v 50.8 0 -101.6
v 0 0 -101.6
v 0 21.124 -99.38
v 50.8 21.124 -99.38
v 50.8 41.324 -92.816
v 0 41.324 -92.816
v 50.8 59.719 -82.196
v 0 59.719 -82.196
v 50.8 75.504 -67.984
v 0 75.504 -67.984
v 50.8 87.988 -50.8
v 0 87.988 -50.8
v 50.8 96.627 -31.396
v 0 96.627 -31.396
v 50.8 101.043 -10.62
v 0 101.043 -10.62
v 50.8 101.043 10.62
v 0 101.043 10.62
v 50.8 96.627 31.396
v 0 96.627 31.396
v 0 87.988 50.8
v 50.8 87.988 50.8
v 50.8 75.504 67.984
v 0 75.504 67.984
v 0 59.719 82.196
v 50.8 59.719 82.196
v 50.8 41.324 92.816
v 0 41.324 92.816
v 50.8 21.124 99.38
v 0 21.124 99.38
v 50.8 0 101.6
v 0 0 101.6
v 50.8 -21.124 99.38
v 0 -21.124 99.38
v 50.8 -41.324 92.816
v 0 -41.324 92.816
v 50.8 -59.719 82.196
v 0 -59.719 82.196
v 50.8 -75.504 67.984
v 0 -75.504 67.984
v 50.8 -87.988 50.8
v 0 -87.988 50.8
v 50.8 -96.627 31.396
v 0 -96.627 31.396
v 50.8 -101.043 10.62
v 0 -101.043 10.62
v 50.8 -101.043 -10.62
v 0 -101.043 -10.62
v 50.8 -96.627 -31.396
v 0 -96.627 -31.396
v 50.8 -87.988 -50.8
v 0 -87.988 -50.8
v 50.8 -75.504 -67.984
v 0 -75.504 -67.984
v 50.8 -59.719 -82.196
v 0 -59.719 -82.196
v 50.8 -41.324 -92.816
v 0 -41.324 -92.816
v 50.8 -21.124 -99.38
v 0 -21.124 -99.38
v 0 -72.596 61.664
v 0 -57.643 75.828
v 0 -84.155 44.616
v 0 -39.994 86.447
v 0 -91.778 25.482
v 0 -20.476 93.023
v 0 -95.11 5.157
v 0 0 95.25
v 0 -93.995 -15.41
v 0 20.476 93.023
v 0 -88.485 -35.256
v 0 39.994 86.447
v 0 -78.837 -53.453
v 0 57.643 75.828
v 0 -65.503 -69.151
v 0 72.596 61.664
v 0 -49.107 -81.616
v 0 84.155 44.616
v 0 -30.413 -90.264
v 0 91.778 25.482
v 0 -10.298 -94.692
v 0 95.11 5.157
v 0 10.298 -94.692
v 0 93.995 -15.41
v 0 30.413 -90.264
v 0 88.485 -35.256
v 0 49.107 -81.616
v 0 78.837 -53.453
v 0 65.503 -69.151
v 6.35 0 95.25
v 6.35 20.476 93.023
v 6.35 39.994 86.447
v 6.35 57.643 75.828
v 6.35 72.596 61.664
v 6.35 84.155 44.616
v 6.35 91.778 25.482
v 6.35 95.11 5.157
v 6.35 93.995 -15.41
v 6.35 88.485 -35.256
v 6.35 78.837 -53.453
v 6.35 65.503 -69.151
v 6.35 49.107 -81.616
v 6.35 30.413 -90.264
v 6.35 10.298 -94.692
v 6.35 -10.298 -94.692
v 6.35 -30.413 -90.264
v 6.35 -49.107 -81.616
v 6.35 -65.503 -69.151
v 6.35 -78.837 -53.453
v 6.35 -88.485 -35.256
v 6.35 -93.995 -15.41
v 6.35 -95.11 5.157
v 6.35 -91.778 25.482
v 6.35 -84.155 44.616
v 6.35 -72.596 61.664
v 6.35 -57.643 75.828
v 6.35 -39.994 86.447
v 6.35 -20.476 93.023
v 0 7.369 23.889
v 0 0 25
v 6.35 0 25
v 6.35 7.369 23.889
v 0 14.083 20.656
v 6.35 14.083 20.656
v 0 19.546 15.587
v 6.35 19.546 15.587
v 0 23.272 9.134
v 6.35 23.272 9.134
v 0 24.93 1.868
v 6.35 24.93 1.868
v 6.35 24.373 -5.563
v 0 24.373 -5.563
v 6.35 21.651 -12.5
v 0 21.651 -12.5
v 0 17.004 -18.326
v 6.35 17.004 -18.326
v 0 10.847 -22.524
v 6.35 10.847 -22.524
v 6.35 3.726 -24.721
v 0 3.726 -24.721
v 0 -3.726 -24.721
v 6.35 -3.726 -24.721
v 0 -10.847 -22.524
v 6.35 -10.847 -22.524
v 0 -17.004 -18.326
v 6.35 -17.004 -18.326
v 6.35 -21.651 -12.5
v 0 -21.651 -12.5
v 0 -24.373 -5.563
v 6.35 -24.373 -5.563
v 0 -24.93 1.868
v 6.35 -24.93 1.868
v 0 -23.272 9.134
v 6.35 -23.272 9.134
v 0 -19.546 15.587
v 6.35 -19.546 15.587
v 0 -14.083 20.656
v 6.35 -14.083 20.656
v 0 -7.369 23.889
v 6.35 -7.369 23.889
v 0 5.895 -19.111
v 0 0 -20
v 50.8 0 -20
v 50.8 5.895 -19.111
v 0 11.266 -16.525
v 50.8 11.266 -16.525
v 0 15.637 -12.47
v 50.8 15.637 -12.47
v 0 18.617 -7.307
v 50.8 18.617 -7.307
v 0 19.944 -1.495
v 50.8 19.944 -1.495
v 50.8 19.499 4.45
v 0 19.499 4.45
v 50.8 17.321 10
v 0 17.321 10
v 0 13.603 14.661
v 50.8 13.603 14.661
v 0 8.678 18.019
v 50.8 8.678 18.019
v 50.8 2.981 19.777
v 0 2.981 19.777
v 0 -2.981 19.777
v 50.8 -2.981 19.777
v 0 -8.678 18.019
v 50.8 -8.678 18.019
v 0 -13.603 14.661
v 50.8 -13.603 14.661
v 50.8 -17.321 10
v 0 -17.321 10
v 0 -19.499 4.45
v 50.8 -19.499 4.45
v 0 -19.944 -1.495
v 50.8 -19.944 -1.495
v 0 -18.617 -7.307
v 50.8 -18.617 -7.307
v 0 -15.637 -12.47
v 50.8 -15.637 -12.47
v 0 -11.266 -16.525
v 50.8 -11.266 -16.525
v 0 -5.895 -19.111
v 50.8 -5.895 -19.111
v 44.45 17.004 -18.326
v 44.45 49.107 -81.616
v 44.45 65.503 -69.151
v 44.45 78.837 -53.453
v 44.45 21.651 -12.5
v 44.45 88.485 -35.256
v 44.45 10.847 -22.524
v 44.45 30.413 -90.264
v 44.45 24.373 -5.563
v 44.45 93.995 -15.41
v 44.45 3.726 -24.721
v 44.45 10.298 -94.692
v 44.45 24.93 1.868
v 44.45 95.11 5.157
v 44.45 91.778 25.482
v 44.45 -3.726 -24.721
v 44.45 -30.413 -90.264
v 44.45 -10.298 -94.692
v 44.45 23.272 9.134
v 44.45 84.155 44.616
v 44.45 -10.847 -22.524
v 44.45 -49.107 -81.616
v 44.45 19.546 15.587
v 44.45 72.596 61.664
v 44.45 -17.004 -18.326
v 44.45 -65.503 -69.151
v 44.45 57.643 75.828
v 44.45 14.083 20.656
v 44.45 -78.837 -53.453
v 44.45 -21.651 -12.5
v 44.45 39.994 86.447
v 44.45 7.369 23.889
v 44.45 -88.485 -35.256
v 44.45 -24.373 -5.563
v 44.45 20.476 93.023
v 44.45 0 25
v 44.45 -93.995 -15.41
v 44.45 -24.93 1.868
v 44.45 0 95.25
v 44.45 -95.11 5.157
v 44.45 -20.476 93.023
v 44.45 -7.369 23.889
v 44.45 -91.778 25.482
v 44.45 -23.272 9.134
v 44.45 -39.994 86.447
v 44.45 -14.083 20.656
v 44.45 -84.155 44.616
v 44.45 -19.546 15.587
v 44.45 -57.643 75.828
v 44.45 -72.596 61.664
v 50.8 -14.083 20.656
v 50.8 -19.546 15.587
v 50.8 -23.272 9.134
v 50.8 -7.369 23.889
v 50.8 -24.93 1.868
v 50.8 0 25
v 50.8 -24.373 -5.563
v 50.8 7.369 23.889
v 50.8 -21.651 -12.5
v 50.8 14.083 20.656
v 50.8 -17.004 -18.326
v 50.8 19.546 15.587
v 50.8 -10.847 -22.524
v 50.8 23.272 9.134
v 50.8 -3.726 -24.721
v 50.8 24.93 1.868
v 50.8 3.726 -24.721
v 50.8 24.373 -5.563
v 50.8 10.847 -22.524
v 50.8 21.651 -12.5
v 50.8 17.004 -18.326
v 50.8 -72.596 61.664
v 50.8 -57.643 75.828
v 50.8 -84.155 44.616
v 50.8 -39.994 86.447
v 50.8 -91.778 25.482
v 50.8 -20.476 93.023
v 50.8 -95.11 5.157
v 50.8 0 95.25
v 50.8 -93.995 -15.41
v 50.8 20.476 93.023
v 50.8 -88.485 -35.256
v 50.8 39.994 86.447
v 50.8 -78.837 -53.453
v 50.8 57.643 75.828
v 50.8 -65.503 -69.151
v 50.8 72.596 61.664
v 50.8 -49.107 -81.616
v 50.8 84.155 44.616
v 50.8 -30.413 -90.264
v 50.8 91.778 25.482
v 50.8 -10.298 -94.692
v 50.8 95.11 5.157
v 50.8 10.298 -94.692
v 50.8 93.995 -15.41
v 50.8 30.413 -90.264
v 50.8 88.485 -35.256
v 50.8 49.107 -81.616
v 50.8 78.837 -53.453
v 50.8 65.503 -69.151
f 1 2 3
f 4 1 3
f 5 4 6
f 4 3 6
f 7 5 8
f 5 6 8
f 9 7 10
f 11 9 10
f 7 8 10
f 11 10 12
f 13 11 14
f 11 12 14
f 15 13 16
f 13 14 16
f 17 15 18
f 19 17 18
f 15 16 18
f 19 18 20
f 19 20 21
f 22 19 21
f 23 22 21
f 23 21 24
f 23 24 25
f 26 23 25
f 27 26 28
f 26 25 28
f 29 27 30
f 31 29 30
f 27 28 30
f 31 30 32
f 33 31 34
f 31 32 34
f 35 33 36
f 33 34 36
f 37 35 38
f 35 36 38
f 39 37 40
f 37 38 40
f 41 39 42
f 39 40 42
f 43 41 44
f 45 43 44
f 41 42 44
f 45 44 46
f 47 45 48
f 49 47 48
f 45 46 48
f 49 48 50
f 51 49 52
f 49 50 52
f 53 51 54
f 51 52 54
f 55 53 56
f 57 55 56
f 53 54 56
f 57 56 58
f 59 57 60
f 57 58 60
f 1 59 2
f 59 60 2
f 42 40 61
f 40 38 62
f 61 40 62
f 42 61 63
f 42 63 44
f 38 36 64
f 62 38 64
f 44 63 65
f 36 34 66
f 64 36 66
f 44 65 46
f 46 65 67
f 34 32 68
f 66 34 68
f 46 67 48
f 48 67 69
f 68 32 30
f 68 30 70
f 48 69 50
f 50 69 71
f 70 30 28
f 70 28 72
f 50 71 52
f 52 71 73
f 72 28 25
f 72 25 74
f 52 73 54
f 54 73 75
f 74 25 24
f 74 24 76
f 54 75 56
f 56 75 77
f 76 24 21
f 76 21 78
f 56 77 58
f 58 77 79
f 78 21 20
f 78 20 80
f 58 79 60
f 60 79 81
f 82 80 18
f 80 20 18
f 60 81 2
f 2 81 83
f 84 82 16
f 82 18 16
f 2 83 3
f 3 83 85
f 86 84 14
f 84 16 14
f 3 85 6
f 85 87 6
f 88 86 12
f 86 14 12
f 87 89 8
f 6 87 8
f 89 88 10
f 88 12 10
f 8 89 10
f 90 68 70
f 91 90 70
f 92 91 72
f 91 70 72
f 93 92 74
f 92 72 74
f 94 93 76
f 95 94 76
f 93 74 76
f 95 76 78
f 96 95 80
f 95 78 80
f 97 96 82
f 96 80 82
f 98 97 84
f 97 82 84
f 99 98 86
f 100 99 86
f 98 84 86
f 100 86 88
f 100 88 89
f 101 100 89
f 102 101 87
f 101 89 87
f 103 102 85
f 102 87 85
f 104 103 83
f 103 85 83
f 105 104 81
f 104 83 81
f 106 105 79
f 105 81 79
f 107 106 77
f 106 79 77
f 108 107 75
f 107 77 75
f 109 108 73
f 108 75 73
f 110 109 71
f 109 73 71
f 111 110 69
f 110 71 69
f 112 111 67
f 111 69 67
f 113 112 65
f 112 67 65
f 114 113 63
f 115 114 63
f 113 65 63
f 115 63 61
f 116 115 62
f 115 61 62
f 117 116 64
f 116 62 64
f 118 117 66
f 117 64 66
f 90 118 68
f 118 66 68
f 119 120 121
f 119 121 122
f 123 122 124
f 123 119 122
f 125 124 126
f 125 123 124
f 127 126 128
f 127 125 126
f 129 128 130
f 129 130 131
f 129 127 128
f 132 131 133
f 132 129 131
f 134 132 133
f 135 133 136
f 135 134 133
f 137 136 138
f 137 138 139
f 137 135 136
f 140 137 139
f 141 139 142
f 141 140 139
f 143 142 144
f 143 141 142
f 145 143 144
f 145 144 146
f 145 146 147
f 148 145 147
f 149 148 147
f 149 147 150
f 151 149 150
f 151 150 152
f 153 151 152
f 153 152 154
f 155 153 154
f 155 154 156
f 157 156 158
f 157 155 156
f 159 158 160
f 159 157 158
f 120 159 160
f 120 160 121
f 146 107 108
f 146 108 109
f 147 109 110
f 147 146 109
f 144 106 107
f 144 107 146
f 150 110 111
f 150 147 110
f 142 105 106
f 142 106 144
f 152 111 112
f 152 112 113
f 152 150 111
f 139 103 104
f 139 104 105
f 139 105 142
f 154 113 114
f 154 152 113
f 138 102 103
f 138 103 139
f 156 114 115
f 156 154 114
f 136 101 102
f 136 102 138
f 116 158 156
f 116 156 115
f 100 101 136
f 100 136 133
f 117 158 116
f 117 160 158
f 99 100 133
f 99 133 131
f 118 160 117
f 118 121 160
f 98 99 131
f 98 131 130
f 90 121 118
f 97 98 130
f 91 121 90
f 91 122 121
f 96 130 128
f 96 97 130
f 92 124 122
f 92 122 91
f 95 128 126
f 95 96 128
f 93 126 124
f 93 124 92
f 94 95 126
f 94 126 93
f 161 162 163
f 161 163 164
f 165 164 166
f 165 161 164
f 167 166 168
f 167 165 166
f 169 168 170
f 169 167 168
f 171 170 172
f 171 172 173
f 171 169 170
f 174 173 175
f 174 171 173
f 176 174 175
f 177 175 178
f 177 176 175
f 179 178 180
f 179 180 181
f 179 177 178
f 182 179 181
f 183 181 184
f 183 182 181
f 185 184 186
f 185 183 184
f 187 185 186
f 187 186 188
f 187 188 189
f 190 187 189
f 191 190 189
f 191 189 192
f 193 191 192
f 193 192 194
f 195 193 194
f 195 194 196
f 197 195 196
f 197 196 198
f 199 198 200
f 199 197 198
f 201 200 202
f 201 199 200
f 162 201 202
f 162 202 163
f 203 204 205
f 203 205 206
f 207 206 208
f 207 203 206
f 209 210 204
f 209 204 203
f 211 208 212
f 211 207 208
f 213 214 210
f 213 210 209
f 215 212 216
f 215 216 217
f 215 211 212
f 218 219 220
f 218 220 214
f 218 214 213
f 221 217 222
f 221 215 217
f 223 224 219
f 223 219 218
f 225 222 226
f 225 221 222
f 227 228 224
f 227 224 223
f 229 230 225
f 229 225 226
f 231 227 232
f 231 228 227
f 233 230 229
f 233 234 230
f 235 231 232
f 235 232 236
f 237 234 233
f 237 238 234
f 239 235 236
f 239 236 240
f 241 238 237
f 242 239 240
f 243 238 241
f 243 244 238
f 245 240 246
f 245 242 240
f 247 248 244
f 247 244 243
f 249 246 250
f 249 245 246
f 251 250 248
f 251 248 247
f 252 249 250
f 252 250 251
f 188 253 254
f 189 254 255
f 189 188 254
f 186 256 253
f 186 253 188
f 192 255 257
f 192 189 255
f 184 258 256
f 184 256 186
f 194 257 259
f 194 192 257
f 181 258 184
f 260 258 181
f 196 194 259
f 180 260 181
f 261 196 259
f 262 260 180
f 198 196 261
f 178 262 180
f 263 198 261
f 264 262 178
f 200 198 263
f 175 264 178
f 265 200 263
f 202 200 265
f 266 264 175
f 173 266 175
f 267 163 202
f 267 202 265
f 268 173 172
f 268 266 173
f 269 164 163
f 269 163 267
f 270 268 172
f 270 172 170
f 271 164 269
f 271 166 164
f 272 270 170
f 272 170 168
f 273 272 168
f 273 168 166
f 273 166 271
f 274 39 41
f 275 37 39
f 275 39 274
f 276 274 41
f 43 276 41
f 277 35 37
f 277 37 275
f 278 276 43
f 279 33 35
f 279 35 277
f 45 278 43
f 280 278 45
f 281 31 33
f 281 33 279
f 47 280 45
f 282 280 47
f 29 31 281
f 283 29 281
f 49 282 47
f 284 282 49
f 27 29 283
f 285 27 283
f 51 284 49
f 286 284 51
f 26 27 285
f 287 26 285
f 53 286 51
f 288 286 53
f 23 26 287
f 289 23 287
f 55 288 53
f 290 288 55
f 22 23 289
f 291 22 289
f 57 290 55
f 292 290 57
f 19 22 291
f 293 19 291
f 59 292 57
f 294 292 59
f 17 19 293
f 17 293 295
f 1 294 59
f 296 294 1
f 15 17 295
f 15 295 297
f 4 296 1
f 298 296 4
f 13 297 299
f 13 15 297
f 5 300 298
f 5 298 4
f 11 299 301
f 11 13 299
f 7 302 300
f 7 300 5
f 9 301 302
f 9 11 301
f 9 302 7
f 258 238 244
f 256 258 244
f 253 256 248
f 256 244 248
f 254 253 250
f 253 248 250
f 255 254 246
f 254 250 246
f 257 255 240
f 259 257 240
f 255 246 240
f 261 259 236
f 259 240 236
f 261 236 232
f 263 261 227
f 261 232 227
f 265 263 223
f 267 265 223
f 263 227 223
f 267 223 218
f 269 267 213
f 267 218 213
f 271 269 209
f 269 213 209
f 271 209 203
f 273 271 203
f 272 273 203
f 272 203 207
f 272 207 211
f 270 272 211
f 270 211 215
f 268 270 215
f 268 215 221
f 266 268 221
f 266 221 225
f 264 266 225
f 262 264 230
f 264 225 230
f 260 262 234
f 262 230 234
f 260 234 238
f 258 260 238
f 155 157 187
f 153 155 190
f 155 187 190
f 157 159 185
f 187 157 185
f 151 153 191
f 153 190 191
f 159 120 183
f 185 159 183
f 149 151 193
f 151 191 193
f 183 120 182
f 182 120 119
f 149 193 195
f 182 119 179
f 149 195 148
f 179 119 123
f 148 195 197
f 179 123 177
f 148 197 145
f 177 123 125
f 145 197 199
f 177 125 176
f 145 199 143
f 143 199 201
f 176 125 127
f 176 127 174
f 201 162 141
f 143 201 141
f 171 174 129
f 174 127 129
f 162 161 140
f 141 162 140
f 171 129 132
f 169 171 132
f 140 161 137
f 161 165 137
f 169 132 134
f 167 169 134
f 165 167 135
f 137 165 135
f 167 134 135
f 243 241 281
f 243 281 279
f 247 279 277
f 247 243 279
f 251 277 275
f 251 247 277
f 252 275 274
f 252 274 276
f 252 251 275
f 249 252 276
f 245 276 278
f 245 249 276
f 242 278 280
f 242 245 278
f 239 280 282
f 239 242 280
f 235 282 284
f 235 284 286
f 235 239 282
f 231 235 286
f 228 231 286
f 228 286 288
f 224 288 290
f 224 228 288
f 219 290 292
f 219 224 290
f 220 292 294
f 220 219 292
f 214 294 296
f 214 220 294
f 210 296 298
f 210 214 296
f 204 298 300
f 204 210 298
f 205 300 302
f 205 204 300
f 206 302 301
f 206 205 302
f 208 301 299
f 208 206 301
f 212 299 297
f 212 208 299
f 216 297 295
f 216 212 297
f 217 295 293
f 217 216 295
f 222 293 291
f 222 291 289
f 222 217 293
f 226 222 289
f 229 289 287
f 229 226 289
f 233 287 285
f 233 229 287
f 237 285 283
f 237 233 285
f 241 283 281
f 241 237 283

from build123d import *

# Parameters (mm, degrees)
SKETCH1_R           = 101.6
SKETCH1_R_2         = 20
BOSS_EXTRUDE1_DEPTH = 50.8
SKETCH2_R           = 95.25
SKETCH2_R_2         = 25
CUT_EXTRUDE1_DEPTH  = 6.35
CUT_EXTRUDE2_START  = -6.35
SKETCH3_R           = 95.25
SKETCH3_R_2         = 25
CUT_EXTRUDE2_DEPTH  = 6.35


with BuildPart() as part:
    # Sketch1 → Boss-Extrude1 (new body)
    with BuildSketch(Plane(origin=(0, 0, 0), x_dir=(0, 0, -1), z_dir=(1, 0, 0))):
        Circle(SKETCH1_R)
        Circle(SKETCH1_R_2, mode=Mode.SUBTRACT)
    extrude(amount=BOSS_EXTRUDE1_DEPTH)

    # Sketch2 → Cut-Extrude1 (cut)
    with BuildSketch(Plane.ZY):
        Circle(SKETCH2_R)
        Circle(SKETCH2_R_2, mode=Mode.SUBTRACT)
    extrude(amount=-CUT_EXTRUDE1_DEPTH, mode=Mode.SUBTRACT)

    # Sketch3 → Cut-Extrude2 (cut)
    with BuildSketch(Plane(origin=(50.8, 0, 0), x_dir=(0, 0, -1), z_dir=(1, 0, 0)).offset(CUT_EXTRUDE2_START)):
        with Locations(Location((0, 0, 0), (0, 0, 180))):
            Circle(SKETCH3_R)
        with Locations(Location((0, 0, 0), (0, 0, 180))):
            Circle(SKETCH3_R_2, mode=Mode.SUBTRACT)
    extrude(amount=CUT_EXTRUDE2_DEPTH, mode=Mode.SUBTRACT)


solid = part.part
